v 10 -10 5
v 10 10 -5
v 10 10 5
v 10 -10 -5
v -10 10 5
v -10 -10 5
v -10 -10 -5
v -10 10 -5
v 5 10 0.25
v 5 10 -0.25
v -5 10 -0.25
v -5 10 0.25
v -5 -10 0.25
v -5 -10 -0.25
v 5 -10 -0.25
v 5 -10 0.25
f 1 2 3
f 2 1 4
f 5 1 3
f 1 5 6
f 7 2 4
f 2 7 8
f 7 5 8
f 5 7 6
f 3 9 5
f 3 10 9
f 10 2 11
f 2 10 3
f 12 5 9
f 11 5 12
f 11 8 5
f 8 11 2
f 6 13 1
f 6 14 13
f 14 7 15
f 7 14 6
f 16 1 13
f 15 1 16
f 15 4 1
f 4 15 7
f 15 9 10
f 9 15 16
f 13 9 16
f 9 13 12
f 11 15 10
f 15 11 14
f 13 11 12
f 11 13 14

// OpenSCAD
// 04 扁缝 —— 10 x 0.5mm 的贯通窄缝
//
// 真值：通道瓶颈半径 = 0.25mm。
//
// 用途：**擦切的阴性对照**。缝的高只有 0.5mm，于是"几乎与缝壁平行"的切片
//       会切出一条极薄的条带，它的最大内切圆可以任意小 —— 那不是通道变窄，
//       是切法造出来的。所以"各个方向多切几刀取最小"必须限制在**横切**上。
difference() {
  cube([20, 20, 10], center = true);
  cube([10, 40, 0.5], center = true);
}
